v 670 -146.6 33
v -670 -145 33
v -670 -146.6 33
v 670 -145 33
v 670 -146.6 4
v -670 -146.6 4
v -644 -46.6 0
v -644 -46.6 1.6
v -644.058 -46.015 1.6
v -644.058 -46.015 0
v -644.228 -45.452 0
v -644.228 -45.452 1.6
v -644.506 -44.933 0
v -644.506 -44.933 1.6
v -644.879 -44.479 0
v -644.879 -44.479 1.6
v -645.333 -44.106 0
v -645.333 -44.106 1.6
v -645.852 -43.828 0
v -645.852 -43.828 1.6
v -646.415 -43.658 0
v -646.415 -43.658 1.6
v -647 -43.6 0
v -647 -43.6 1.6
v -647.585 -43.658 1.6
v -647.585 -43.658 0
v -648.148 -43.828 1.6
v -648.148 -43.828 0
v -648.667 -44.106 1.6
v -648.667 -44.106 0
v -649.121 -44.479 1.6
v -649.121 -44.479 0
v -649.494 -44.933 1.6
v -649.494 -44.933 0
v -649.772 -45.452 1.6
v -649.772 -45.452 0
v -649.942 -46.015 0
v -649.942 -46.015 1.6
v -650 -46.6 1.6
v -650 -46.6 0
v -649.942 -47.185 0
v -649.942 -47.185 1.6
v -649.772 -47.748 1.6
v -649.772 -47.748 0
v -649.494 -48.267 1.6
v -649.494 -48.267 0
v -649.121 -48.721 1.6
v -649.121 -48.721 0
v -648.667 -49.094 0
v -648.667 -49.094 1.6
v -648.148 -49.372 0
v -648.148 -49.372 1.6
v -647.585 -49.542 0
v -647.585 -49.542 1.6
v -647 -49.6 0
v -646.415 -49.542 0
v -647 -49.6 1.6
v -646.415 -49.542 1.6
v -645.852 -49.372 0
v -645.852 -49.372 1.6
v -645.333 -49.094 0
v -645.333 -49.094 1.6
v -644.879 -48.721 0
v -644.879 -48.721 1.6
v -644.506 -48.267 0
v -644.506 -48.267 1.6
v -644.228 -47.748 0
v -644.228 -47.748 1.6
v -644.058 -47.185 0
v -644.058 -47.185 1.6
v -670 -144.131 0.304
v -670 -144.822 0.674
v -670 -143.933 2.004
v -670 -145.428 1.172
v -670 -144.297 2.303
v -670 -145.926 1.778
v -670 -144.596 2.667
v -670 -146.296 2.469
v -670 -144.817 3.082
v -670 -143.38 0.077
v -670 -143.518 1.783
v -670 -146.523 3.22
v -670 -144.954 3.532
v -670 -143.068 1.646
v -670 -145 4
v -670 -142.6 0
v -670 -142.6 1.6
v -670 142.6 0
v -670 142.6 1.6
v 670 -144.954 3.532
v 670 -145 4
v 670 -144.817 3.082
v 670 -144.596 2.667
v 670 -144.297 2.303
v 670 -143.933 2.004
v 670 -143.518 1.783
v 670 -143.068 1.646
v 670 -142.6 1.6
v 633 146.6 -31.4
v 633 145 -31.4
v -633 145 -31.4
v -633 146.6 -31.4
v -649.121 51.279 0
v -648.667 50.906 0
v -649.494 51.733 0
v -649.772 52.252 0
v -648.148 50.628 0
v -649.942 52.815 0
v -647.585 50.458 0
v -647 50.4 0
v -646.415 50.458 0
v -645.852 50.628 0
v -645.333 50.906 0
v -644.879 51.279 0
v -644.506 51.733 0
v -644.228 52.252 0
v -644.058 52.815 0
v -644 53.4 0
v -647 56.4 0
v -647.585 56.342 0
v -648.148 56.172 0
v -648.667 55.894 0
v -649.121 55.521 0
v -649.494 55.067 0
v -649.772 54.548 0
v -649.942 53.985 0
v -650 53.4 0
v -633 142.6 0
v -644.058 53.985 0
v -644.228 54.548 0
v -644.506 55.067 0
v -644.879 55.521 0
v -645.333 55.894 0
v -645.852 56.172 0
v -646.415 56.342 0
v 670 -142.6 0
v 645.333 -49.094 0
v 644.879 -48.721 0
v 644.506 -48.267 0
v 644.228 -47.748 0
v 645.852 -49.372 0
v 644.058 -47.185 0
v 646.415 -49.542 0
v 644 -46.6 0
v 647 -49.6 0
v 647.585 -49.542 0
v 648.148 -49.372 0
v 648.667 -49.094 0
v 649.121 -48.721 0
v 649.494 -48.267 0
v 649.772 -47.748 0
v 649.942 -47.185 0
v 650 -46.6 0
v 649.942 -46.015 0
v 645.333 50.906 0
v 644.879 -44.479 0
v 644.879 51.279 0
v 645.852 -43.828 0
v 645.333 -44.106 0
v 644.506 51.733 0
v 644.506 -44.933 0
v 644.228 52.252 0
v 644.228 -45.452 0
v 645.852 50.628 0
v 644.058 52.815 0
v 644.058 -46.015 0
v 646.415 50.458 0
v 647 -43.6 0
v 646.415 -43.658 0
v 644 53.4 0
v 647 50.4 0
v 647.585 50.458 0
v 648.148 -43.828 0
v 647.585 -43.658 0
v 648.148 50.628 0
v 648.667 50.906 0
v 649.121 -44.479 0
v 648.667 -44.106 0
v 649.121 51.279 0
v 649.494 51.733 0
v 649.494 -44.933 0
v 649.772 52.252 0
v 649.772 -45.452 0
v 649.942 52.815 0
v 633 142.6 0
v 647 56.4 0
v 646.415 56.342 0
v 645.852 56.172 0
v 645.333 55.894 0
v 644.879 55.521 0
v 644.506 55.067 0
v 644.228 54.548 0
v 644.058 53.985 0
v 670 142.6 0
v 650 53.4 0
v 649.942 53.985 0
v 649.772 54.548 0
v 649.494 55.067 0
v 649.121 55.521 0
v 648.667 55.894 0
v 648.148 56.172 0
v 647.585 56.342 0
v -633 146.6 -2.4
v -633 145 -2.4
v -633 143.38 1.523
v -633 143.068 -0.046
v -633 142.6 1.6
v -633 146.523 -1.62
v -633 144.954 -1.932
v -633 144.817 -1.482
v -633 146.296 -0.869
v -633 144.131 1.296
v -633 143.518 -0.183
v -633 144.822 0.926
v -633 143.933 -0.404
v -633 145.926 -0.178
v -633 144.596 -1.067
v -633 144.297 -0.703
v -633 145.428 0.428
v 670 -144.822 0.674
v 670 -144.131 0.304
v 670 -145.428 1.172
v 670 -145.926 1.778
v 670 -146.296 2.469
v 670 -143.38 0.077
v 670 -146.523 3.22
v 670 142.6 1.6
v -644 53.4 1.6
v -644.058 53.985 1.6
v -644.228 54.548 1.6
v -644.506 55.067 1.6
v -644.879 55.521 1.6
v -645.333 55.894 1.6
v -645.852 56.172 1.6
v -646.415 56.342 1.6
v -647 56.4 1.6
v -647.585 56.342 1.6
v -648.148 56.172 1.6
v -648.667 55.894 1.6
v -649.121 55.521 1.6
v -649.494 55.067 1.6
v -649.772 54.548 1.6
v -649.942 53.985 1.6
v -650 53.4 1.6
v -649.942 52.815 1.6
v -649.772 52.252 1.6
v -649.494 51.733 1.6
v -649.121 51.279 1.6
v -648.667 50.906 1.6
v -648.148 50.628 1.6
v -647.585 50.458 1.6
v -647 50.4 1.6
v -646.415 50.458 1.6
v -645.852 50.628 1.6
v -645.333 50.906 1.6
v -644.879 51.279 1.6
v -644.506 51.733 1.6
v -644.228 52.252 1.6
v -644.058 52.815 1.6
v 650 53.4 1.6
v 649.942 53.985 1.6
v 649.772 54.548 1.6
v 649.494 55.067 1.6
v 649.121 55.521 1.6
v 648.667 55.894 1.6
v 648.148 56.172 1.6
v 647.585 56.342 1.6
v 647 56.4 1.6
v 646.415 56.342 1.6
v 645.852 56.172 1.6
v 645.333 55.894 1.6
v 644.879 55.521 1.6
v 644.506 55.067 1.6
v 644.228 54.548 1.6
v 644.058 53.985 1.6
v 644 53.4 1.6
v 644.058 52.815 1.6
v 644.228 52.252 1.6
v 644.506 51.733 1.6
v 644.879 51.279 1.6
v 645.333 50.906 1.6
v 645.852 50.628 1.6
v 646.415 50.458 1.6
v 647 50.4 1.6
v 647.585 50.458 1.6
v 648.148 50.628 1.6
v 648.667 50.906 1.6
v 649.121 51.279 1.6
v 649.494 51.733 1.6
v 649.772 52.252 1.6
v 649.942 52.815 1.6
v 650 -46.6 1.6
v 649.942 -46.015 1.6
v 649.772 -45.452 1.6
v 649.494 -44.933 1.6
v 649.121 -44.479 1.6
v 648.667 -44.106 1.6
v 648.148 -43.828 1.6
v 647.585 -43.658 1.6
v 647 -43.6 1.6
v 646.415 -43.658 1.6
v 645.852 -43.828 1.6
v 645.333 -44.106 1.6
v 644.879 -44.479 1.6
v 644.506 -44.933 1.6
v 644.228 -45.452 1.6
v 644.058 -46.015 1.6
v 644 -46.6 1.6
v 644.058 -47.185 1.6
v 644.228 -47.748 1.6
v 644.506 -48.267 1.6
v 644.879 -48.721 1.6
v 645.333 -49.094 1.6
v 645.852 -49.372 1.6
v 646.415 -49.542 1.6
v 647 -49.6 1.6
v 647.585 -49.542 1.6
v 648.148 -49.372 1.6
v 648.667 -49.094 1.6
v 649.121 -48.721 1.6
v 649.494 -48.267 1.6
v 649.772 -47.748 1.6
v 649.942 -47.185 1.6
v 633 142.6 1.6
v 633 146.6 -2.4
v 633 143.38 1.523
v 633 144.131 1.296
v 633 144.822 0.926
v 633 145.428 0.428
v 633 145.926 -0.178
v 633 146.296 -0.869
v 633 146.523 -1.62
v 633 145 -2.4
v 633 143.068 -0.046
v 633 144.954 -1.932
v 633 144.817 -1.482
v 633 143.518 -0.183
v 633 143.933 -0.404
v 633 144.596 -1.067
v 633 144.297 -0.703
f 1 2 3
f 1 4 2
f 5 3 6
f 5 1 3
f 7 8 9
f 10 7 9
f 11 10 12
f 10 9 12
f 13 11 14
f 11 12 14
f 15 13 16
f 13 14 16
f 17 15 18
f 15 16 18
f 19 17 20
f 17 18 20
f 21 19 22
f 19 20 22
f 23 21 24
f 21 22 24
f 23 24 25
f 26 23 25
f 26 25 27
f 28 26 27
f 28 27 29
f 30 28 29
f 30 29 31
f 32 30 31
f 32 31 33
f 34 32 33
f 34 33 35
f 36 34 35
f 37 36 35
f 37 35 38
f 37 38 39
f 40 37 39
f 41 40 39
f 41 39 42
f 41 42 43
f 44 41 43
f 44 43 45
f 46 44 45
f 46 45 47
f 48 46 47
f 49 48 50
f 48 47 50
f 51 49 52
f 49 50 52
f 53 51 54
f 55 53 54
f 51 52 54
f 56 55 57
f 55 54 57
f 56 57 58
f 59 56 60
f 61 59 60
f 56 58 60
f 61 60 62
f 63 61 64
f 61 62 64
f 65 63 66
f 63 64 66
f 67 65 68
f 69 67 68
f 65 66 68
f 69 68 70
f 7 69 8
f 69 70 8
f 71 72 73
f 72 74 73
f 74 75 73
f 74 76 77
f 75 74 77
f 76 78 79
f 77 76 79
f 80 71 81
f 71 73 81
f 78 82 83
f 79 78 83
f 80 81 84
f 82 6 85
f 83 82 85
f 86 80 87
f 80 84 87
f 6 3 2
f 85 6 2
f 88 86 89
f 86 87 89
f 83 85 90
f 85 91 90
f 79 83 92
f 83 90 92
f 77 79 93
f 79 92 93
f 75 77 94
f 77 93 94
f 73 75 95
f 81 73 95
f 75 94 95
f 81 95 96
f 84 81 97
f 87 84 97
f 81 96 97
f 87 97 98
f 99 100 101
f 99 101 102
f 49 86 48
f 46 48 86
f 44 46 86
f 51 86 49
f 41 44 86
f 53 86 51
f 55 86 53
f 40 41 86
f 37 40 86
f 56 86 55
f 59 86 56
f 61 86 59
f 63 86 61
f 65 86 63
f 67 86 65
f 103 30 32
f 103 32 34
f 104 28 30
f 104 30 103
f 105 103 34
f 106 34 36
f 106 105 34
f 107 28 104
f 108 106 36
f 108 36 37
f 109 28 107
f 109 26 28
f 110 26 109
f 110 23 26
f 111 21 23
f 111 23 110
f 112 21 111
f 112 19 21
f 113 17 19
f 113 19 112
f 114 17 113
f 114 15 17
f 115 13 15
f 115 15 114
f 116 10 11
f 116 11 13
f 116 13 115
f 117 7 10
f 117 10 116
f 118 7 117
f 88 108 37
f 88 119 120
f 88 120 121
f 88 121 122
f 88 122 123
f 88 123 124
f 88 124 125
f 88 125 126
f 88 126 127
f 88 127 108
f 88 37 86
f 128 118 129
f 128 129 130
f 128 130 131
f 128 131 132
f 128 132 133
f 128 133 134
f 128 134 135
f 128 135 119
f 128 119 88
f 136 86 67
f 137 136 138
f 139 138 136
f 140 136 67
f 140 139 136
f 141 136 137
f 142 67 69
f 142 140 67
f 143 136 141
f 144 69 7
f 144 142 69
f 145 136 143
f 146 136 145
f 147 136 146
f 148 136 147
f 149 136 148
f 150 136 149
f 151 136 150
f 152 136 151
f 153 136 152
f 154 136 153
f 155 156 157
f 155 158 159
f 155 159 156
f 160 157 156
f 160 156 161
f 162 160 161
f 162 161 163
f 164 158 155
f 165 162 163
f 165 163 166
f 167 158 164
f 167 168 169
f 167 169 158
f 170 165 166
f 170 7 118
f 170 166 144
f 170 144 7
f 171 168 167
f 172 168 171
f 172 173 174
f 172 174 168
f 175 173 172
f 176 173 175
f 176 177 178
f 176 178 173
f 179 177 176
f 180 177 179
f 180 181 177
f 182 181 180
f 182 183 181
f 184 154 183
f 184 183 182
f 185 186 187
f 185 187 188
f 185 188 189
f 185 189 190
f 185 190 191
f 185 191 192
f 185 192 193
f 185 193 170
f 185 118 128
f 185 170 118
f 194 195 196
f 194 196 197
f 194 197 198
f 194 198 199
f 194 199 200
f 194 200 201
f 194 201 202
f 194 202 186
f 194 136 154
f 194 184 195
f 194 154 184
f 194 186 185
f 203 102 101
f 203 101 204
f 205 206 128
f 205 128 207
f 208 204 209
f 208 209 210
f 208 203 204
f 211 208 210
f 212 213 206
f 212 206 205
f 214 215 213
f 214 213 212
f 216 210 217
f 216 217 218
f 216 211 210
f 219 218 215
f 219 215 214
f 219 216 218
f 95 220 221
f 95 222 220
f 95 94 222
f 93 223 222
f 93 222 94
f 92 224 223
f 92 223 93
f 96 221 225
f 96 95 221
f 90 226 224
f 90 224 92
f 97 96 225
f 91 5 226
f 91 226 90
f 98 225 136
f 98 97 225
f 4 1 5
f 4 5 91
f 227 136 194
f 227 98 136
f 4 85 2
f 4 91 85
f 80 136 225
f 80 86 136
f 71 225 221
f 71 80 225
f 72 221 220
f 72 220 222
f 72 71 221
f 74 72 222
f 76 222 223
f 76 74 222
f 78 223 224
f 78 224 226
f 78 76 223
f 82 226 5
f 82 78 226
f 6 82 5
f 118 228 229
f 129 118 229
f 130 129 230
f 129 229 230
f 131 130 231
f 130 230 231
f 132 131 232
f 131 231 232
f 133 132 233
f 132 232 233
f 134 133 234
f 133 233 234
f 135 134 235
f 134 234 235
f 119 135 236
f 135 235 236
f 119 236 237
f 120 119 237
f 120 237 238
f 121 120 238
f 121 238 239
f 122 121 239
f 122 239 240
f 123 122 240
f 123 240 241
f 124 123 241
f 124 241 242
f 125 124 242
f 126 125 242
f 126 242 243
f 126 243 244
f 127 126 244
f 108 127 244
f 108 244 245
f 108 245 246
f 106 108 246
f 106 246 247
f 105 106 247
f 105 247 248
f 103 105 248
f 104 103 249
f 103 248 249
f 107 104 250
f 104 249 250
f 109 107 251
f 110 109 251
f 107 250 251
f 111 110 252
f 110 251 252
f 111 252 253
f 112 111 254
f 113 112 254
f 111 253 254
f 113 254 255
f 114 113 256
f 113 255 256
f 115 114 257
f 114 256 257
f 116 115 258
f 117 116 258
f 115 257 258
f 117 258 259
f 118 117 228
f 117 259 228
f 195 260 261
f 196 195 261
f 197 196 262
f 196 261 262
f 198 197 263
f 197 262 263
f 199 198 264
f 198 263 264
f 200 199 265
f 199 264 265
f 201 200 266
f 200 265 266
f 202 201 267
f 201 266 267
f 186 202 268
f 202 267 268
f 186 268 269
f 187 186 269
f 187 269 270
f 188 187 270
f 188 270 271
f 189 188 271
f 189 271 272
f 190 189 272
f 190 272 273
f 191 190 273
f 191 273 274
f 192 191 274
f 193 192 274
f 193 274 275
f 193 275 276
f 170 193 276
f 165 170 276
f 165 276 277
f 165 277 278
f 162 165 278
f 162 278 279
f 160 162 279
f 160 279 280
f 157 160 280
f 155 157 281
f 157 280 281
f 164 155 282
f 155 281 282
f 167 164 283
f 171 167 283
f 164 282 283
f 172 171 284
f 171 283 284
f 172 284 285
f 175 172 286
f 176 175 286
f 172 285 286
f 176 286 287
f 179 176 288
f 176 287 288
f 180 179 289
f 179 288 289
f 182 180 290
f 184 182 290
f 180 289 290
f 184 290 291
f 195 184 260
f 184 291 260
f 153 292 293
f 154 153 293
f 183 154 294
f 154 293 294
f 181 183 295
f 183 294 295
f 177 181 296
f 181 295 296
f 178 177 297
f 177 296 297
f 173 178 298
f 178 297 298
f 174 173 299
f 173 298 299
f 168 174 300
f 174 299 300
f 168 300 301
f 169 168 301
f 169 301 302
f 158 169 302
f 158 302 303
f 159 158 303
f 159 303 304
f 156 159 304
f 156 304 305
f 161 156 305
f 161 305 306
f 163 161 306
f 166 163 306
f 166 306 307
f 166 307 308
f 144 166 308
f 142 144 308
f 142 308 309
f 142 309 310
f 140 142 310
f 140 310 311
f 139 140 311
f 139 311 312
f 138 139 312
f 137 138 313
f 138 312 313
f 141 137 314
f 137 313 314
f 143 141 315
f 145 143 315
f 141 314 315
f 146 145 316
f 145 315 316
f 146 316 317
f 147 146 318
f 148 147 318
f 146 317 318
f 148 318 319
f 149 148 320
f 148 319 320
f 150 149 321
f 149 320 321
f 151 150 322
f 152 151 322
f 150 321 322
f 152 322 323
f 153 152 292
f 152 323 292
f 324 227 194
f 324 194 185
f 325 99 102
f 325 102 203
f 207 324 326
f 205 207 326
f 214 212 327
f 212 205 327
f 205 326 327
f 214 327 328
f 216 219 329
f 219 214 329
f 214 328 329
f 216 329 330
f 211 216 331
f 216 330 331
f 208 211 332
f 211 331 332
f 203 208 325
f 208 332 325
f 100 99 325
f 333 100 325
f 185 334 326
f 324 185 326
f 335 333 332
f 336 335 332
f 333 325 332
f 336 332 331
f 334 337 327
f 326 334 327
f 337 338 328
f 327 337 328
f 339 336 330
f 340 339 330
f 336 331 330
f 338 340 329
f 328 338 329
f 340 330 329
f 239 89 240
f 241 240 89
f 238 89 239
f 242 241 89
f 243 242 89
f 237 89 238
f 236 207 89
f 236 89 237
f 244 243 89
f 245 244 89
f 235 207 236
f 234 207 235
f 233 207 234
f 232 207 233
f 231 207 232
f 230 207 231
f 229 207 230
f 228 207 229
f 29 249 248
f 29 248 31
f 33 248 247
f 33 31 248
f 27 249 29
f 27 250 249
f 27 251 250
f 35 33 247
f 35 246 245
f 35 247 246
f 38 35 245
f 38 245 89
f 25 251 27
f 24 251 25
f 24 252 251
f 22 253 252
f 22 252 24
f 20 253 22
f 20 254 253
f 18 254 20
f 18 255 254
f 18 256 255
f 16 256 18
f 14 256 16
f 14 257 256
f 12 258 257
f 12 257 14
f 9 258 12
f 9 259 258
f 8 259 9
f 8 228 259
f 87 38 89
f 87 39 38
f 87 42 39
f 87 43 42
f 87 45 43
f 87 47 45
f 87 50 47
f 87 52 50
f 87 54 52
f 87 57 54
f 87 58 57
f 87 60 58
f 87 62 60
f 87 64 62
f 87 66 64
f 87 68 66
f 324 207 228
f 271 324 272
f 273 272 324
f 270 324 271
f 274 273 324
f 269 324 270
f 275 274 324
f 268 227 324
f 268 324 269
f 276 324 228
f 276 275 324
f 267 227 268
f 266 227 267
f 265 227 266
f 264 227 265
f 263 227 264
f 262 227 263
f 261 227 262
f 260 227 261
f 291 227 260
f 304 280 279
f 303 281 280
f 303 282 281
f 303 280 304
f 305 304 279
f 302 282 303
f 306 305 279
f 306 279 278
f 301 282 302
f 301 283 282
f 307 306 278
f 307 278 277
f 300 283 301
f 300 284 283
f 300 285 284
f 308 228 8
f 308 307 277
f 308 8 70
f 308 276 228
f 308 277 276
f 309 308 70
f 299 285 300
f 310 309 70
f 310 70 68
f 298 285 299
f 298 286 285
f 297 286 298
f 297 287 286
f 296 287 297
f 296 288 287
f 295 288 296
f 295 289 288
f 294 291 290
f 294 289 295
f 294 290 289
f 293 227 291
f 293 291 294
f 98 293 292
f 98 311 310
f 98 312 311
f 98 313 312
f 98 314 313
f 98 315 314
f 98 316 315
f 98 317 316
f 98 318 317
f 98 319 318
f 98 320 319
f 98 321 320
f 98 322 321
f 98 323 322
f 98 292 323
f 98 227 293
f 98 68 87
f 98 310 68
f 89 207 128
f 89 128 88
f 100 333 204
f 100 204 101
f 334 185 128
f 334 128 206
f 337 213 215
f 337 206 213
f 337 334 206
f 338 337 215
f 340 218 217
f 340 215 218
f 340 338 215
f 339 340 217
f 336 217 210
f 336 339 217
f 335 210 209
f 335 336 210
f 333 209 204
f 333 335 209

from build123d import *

# Parameters (mm, degrees)
F1_DEPTH = 670
F2_R     = 4
F3_R     = 2.4
F4_W     = 37
F4_H     = 35.4
F5_DEPTH = 4
F6_R     = 3
F7_DEPTH = 25


with BuildPart() as f1:
    # F0 (on Right) → F1 (new body, symmetric)
    with BuildSketch(Plane.YZ):
        Polygon((-146.6, 0), (145, 0), (145, -31.4), (146.6, -31.4), (146.6, 1.6), (-145, 1.6), (-145, 33), (-146.6, 33), align=None)
    extrude(amount=F1_DEPTH, both=True)

    # F2
    f2_edges = [f1.edges().sort_by_distance(p)[0] for p in [
        (0, -146.6, 0),
        (0, 146.6, 1.6),
    ]]
    fillet(f2_edges, radius=F2_R)

    # F3
    f3_edges = [f1.edges().sort_by_distance(p)[0] for p in [
        (0, -145, 1.6),
        (0, 145, 0),
    ]]
    fillet(f3_edges, radius=F3_R)

    # F4 (on face) → F5 (cut)
    with BuildSketch(Plane(origin=(0, 146.6, 0), x_dir=(-1, 0, 0), z_dir=(0, 1, 0))):
        with Locations((-651.5, -13.7)):
            Rectangle(F4_W, F4_H)
        with Locations((651.5, -13.7)):
            Rectangle(F4_W, F4_H)
    extrude(amount=-F5_DEPTH, mode=Mode.SUBTRACT)

    # F6 (on face) → F7 (cut)
    with BuildSketch(Plane.XY.offset(1.6)):
        with Locations((-647, -46.6)):
            Circle(F6_R)
        with Locations((-647, 53.4)):
            Circle(F6_R)
        with Locations((647, 53.4)):
            Circle(F6_R)
        with Locations((647, -46.6)):
            Circle(F6_R)
    extrude(amount=-F7_DEPTH, mode=Mode.SUBTRACT)


solid = f1.part
